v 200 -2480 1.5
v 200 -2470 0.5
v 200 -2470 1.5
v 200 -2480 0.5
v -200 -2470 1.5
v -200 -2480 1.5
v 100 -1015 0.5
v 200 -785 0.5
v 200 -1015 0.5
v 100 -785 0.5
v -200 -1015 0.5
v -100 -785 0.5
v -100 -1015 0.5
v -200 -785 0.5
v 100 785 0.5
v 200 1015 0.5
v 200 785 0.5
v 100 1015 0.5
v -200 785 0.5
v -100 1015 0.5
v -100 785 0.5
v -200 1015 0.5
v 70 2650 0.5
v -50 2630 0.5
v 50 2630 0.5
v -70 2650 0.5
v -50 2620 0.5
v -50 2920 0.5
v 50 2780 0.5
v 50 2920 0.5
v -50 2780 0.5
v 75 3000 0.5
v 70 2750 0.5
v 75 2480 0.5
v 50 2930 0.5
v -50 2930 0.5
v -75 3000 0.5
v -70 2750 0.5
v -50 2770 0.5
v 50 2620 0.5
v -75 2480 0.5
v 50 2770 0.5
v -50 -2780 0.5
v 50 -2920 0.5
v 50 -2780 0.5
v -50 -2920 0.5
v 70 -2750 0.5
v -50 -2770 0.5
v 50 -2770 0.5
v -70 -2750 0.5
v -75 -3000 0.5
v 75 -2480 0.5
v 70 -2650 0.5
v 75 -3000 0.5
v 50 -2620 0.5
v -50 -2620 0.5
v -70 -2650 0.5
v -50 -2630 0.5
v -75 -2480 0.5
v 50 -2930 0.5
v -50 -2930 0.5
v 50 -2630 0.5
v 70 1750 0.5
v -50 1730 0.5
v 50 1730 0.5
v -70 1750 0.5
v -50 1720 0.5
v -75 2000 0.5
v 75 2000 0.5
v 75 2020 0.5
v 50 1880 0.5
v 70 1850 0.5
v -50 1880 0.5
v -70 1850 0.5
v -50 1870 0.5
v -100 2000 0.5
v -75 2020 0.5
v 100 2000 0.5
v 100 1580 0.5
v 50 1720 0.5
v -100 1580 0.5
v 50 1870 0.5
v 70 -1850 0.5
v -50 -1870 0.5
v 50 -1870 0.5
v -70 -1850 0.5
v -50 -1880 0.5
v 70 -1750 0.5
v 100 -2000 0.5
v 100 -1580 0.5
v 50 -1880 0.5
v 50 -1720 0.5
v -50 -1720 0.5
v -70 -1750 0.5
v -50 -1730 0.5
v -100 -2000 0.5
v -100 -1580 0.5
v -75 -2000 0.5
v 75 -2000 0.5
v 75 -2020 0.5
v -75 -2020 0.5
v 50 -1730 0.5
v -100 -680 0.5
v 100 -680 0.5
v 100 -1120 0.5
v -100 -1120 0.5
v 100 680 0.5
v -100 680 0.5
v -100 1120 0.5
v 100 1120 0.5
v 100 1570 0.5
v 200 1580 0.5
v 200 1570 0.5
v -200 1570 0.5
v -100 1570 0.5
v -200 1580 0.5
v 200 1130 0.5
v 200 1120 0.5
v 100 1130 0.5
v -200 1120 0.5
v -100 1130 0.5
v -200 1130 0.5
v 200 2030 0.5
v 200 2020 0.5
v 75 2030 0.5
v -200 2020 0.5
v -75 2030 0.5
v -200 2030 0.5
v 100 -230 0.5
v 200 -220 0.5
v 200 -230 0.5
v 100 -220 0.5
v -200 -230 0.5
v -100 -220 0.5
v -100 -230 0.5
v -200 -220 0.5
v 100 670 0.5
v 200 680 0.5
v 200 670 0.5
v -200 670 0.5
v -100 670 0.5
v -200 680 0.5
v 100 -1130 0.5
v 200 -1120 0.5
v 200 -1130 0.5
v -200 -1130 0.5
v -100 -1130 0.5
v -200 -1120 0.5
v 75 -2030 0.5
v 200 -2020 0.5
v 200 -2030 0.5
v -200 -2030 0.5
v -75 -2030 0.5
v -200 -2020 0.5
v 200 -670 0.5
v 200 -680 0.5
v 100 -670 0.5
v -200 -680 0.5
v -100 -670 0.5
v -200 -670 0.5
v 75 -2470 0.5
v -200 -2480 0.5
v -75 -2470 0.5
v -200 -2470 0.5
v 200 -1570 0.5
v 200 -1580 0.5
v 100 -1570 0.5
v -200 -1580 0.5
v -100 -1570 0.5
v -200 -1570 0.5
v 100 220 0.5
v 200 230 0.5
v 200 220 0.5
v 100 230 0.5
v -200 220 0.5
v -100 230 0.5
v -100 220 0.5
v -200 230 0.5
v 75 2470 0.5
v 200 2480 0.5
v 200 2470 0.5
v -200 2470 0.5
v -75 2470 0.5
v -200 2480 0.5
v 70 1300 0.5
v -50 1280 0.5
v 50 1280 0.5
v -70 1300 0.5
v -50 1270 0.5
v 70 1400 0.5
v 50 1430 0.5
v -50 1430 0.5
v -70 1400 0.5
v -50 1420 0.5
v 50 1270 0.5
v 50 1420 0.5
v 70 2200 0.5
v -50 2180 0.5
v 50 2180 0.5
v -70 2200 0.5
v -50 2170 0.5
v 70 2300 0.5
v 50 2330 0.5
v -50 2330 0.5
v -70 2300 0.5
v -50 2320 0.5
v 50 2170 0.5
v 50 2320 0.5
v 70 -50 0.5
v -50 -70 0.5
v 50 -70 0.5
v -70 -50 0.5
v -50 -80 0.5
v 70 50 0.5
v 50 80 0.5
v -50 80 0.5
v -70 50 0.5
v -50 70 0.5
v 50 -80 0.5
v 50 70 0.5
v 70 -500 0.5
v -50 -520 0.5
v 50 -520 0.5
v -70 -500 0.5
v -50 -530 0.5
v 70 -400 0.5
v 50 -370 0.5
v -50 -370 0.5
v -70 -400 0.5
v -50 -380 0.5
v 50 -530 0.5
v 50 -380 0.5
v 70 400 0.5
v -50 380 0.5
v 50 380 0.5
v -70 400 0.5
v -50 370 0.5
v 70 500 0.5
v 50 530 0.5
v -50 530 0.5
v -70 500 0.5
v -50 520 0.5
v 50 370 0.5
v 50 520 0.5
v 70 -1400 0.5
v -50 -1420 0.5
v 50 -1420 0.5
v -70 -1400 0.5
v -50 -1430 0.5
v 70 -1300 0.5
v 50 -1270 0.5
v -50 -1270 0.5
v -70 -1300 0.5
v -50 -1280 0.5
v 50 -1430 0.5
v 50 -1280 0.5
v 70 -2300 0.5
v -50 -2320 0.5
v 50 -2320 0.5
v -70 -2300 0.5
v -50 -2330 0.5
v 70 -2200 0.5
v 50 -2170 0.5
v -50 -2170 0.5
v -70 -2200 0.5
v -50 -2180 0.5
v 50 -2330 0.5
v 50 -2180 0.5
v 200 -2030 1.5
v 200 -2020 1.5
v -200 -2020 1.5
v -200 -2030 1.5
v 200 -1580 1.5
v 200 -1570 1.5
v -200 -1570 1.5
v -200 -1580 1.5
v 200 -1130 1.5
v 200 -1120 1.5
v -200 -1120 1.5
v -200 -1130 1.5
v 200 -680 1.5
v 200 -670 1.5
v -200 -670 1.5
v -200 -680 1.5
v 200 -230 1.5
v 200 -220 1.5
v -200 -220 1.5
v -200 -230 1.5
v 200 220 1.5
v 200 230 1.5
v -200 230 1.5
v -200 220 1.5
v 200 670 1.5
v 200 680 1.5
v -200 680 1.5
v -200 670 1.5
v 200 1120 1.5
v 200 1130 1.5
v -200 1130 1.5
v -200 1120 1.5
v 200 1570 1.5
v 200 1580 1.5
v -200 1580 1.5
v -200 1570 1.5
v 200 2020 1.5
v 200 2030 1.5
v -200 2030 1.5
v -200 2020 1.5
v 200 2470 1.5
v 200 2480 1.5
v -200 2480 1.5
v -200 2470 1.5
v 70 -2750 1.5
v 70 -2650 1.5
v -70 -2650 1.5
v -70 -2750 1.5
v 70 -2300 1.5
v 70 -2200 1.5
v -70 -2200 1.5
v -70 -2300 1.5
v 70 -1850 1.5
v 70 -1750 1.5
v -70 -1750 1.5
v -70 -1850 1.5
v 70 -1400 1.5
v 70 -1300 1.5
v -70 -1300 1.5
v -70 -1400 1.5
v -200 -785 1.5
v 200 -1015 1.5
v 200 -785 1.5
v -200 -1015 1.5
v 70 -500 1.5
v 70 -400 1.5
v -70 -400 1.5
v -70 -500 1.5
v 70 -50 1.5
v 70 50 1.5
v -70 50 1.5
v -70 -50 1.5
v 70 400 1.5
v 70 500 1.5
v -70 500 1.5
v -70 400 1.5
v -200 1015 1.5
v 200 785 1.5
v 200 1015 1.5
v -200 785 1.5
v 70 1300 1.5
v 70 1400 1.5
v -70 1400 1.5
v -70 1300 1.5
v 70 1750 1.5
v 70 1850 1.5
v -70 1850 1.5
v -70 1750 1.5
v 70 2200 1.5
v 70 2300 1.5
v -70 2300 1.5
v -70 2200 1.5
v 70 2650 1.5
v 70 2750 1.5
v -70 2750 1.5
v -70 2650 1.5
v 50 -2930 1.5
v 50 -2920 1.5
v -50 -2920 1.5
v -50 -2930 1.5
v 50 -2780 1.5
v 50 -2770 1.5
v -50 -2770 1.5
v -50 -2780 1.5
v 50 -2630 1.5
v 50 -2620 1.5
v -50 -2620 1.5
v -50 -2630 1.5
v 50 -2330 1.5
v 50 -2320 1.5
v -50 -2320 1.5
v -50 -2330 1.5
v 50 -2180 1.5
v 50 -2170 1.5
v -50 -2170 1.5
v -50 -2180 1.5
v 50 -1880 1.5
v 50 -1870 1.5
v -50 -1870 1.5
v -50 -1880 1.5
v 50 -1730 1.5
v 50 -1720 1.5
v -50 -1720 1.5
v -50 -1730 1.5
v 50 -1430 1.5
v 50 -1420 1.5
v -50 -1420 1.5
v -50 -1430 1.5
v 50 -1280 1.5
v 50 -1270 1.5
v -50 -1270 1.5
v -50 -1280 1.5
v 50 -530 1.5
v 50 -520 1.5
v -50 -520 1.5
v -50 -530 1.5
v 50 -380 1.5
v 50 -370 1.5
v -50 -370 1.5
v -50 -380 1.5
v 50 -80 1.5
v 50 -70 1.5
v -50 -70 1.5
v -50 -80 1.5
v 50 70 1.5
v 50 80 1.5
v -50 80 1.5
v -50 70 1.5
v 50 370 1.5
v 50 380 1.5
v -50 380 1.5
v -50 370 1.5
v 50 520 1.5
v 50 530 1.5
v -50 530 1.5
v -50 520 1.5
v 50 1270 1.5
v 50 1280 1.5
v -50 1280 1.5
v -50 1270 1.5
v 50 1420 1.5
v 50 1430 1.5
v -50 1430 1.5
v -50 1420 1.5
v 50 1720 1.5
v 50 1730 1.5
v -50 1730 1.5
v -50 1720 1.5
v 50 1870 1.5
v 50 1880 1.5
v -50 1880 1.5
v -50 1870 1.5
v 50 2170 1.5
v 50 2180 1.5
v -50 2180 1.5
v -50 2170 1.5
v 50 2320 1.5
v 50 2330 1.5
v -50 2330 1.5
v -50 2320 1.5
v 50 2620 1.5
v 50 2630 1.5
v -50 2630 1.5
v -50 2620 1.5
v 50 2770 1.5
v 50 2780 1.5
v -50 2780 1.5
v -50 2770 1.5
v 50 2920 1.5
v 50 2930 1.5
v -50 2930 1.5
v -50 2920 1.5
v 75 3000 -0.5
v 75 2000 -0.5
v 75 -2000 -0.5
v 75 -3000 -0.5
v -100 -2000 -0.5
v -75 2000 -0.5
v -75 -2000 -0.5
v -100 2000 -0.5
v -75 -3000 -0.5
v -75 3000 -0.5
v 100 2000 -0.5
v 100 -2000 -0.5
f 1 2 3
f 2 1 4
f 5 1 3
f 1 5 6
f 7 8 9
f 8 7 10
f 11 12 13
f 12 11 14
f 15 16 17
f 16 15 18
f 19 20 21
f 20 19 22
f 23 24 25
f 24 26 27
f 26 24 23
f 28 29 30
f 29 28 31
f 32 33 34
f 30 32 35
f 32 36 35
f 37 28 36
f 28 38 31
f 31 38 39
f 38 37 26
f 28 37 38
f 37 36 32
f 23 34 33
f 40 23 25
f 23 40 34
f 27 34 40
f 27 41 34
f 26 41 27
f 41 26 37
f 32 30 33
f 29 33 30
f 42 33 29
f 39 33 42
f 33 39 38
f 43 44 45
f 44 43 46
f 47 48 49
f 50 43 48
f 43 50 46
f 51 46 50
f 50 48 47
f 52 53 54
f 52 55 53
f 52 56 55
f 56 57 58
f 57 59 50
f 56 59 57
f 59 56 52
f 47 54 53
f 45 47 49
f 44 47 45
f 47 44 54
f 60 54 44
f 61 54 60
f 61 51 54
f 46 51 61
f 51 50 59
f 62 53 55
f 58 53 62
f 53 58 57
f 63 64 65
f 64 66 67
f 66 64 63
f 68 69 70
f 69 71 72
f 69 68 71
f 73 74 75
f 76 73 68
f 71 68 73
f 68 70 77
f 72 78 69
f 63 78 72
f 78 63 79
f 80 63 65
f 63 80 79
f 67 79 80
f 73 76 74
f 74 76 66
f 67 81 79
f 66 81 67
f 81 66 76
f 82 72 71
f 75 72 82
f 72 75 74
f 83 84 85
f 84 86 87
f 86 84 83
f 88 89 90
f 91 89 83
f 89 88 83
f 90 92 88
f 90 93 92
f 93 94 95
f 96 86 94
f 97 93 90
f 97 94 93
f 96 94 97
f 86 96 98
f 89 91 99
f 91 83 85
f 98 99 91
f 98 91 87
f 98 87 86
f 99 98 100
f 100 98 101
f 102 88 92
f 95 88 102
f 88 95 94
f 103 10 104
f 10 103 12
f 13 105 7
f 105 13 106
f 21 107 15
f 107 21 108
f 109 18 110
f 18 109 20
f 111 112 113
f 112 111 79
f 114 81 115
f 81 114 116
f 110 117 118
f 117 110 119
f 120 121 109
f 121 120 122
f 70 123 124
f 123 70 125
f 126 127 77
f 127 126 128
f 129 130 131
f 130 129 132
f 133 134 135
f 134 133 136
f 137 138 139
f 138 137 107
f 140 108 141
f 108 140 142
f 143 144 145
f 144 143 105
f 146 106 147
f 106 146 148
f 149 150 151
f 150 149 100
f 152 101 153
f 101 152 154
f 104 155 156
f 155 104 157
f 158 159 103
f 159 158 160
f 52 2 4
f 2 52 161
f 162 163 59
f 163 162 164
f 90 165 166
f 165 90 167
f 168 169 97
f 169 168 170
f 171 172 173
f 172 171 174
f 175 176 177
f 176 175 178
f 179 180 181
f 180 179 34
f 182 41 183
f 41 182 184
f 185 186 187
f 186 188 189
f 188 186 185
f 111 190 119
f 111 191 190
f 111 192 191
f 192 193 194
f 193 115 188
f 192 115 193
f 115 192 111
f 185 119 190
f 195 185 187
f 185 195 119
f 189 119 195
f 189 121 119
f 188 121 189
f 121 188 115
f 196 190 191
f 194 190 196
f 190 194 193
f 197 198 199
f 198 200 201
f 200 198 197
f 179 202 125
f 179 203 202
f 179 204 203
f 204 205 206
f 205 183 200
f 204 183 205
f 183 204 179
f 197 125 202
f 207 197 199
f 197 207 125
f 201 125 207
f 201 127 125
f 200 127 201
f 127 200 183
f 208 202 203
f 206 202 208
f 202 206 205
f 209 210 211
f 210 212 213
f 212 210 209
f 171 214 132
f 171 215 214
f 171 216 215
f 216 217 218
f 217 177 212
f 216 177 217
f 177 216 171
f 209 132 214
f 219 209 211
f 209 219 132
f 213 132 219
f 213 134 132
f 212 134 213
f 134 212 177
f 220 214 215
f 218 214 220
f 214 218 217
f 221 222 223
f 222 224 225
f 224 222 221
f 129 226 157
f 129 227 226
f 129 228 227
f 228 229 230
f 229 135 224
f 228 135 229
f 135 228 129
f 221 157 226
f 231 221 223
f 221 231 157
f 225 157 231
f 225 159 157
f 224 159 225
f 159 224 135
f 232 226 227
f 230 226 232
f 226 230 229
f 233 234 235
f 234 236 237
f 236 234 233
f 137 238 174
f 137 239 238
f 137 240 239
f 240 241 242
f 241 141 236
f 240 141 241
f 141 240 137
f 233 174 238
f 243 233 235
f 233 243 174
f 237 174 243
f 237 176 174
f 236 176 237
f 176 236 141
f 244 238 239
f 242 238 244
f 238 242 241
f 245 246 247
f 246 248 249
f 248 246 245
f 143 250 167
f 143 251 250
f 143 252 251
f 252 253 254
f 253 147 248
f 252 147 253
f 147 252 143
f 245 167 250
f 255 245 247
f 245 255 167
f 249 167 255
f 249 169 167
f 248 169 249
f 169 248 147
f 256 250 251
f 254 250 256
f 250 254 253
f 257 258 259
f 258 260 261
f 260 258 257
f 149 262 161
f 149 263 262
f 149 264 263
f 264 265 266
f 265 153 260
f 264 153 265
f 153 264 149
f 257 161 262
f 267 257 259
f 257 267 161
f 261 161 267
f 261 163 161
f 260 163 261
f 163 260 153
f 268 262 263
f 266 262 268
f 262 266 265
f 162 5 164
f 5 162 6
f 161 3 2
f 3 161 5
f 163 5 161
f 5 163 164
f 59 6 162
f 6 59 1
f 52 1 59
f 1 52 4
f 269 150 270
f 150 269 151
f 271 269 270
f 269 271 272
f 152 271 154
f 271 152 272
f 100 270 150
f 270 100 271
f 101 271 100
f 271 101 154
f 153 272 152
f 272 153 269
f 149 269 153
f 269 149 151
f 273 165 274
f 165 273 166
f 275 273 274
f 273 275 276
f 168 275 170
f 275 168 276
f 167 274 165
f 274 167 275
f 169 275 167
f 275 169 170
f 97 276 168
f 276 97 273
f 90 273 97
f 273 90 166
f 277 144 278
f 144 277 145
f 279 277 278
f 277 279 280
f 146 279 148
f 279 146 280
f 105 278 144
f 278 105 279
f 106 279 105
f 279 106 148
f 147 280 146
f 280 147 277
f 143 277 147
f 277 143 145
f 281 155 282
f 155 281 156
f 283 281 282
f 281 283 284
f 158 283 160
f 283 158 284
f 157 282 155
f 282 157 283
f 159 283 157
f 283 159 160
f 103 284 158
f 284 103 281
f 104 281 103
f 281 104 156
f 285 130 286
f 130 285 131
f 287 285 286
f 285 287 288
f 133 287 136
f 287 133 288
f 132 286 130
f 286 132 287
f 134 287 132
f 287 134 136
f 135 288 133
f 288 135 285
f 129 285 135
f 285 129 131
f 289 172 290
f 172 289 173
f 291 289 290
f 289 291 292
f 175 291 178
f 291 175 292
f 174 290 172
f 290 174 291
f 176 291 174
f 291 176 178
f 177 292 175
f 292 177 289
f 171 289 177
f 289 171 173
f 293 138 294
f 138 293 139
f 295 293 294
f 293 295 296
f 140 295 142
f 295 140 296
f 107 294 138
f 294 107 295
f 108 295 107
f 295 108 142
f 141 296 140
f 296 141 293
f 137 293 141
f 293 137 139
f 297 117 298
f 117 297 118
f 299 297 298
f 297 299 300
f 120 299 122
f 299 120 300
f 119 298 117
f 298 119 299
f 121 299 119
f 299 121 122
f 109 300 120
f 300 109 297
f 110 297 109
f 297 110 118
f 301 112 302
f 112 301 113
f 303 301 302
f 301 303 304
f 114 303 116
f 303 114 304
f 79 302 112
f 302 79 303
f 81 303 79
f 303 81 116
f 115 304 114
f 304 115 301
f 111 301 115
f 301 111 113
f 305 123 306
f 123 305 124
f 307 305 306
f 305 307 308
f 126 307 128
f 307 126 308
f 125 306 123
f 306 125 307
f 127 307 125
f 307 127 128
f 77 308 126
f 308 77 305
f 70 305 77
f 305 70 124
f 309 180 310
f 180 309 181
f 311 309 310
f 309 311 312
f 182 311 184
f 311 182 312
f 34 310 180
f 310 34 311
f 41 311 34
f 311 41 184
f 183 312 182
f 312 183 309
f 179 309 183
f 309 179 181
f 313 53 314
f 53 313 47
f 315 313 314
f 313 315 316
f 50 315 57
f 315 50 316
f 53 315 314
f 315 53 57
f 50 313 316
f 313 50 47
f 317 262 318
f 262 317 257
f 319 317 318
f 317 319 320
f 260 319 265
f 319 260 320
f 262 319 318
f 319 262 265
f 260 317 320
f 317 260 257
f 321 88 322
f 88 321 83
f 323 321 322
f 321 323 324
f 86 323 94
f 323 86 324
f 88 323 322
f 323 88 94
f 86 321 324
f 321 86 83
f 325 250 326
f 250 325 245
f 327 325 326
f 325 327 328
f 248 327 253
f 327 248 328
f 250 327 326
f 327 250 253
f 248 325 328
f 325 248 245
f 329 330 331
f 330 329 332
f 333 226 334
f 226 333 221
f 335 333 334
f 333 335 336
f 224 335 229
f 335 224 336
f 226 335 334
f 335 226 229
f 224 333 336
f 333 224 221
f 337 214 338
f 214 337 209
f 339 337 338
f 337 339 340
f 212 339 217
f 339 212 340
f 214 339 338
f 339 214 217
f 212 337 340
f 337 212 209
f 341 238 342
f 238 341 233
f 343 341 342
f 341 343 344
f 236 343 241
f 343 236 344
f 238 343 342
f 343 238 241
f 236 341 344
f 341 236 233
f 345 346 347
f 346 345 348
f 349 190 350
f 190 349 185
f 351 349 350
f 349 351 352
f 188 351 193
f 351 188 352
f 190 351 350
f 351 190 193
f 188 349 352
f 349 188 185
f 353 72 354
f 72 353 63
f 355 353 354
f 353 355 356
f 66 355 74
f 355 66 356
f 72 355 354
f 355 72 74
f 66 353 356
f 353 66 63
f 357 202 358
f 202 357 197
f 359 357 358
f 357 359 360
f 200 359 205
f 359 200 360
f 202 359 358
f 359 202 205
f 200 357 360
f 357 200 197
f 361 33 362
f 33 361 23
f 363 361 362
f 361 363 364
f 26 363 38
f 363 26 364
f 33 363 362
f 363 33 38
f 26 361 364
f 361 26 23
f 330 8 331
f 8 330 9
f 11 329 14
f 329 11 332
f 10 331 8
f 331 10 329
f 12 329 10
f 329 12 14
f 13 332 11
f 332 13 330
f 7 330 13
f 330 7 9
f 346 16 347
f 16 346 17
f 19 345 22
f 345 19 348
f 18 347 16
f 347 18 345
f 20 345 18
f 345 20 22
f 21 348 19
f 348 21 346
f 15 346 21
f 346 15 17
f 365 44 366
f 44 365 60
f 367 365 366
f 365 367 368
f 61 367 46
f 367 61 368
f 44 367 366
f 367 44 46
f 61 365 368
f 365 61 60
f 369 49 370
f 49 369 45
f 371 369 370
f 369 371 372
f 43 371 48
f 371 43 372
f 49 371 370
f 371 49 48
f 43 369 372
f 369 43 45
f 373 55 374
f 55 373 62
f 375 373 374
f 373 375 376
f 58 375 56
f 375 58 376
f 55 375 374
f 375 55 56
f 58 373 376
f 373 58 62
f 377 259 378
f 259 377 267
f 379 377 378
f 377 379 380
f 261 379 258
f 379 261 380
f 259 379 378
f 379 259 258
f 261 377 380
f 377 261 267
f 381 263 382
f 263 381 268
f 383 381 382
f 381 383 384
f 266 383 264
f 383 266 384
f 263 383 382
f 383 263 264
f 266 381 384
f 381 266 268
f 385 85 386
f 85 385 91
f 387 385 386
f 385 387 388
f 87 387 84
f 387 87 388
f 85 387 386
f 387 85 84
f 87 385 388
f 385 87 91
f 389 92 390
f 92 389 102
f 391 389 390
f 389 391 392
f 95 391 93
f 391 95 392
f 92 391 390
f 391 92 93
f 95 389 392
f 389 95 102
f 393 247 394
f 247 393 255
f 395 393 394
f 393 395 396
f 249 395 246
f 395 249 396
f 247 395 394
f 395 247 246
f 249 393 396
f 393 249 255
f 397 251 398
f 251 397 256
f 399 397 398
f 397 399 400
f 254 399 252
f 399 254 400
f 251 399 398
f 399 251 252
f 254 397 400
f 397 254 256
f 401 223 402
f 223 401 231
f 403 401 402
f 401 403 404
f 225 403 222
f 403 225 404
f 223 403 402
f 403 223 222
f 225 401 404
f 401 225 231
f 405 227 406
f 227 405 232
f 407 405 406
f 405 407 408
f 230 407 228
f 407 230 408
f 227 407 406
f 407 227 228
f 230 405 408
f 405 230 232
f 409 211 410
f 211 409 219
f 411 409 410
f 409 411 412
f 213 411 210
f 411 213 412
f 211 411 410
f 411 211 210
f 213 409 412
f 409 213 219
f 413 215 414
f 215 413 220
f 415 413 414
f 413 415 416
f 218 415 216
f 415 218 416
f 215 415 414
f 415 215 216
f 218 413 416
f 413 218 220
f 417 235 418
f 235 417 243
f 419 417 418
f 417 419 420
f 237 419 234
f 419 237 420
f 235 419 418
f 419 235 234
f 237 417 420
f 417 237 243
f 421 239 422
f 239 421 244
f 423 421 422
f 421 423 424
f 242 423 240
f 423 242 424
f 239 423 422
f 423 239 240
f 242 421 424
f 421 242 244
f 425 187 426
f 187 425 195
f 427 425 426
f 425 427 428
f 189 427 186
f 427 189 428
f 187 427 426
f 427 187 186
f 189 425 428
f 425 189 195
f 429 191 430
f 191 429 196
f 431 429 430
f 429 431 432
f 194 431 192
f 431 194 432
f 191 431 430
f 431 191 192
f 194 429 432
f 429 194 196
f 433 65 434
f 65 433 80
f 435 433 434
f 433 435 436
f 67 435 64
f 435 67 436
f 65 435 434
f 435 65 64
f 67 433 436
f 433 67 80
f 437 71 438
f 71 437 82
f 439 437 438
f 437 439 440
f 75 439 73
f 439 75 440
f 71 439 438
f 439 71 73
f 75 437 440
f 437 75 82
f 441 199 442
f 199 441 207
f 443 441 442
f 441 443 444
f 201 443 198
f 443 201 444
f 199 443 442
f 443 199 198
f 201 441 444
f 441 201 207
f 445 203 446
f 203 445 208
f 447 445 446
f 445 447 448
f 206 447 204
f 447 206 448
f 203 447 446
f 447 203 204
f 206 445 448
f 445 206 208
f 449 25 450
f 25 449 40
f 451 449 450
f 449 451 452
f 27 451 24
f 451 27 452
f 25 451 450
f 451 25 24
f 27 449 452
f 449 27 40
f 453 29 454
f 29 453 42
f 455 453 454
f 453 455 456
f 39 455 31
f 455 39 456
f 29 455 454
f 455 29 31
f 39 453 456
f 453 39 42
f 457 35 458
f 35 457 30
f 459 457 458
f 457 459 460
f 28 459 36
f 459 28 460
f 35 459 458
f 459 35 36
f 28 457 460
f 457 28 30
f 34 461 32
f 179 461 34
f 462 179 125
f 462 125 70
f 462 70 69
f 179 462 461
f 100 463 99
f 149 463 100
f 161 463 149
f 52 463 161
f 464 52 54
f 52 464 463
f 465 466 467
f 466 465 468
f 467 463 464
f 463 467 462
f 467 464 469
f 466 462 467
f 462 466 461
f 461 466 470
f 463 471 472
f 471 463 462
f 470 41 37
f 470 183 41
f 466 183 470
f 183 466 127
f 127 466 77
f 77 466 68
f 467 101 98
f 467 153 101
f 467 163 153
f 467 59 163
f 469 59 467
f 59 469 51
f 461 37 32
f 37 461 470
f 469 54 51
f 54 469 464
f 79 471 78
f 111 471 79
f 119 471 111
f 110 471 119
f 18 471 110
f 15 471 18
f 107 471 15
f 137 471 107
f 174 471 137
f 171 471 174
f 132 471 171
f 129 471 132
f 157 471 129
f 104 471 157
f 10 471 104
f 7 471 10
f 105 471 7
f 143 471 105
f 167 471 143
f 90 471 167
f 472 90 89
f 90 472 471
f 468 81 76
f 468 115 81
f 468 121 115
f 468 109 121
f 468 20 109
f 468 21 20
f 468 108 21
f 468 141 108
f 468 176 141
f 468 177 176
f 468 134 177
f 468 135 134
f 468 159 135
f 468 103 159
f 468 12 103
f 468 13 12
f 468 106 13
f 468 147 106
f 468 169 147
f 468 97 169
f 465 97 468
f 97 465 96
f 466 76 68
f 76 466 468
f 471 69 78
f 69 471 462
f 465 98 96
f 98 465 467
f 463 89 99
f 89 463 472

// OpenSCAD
$fs=$fs/4;
$fa=$fa/4;


cube([150,6000,1], center = true);
cube([200,4000,1], center = true);

for(i=[0:11]){
    translate([0,(i-5.5)*450,1]) color("green") cube([400,10,1], center = true);
}

for(i=[0:12]){
    translate([0,(i-6)*450,1]) color("green") cube([140,100,1], center = true);
}


for(i=[-1,1]){
    translate([0,i*900,1]) color("green") cube([400,230,1], center = true);
}

for(i=[0:39]){
    translate([0,(i-19.5)*150,1]) color("blue") cube([100,10,1], center = true);
}

for(i=[0:7]){
    %translate([-300,(i-3.5)*750,1]) color("blue")  cube([400,10,1], center = true);
}
